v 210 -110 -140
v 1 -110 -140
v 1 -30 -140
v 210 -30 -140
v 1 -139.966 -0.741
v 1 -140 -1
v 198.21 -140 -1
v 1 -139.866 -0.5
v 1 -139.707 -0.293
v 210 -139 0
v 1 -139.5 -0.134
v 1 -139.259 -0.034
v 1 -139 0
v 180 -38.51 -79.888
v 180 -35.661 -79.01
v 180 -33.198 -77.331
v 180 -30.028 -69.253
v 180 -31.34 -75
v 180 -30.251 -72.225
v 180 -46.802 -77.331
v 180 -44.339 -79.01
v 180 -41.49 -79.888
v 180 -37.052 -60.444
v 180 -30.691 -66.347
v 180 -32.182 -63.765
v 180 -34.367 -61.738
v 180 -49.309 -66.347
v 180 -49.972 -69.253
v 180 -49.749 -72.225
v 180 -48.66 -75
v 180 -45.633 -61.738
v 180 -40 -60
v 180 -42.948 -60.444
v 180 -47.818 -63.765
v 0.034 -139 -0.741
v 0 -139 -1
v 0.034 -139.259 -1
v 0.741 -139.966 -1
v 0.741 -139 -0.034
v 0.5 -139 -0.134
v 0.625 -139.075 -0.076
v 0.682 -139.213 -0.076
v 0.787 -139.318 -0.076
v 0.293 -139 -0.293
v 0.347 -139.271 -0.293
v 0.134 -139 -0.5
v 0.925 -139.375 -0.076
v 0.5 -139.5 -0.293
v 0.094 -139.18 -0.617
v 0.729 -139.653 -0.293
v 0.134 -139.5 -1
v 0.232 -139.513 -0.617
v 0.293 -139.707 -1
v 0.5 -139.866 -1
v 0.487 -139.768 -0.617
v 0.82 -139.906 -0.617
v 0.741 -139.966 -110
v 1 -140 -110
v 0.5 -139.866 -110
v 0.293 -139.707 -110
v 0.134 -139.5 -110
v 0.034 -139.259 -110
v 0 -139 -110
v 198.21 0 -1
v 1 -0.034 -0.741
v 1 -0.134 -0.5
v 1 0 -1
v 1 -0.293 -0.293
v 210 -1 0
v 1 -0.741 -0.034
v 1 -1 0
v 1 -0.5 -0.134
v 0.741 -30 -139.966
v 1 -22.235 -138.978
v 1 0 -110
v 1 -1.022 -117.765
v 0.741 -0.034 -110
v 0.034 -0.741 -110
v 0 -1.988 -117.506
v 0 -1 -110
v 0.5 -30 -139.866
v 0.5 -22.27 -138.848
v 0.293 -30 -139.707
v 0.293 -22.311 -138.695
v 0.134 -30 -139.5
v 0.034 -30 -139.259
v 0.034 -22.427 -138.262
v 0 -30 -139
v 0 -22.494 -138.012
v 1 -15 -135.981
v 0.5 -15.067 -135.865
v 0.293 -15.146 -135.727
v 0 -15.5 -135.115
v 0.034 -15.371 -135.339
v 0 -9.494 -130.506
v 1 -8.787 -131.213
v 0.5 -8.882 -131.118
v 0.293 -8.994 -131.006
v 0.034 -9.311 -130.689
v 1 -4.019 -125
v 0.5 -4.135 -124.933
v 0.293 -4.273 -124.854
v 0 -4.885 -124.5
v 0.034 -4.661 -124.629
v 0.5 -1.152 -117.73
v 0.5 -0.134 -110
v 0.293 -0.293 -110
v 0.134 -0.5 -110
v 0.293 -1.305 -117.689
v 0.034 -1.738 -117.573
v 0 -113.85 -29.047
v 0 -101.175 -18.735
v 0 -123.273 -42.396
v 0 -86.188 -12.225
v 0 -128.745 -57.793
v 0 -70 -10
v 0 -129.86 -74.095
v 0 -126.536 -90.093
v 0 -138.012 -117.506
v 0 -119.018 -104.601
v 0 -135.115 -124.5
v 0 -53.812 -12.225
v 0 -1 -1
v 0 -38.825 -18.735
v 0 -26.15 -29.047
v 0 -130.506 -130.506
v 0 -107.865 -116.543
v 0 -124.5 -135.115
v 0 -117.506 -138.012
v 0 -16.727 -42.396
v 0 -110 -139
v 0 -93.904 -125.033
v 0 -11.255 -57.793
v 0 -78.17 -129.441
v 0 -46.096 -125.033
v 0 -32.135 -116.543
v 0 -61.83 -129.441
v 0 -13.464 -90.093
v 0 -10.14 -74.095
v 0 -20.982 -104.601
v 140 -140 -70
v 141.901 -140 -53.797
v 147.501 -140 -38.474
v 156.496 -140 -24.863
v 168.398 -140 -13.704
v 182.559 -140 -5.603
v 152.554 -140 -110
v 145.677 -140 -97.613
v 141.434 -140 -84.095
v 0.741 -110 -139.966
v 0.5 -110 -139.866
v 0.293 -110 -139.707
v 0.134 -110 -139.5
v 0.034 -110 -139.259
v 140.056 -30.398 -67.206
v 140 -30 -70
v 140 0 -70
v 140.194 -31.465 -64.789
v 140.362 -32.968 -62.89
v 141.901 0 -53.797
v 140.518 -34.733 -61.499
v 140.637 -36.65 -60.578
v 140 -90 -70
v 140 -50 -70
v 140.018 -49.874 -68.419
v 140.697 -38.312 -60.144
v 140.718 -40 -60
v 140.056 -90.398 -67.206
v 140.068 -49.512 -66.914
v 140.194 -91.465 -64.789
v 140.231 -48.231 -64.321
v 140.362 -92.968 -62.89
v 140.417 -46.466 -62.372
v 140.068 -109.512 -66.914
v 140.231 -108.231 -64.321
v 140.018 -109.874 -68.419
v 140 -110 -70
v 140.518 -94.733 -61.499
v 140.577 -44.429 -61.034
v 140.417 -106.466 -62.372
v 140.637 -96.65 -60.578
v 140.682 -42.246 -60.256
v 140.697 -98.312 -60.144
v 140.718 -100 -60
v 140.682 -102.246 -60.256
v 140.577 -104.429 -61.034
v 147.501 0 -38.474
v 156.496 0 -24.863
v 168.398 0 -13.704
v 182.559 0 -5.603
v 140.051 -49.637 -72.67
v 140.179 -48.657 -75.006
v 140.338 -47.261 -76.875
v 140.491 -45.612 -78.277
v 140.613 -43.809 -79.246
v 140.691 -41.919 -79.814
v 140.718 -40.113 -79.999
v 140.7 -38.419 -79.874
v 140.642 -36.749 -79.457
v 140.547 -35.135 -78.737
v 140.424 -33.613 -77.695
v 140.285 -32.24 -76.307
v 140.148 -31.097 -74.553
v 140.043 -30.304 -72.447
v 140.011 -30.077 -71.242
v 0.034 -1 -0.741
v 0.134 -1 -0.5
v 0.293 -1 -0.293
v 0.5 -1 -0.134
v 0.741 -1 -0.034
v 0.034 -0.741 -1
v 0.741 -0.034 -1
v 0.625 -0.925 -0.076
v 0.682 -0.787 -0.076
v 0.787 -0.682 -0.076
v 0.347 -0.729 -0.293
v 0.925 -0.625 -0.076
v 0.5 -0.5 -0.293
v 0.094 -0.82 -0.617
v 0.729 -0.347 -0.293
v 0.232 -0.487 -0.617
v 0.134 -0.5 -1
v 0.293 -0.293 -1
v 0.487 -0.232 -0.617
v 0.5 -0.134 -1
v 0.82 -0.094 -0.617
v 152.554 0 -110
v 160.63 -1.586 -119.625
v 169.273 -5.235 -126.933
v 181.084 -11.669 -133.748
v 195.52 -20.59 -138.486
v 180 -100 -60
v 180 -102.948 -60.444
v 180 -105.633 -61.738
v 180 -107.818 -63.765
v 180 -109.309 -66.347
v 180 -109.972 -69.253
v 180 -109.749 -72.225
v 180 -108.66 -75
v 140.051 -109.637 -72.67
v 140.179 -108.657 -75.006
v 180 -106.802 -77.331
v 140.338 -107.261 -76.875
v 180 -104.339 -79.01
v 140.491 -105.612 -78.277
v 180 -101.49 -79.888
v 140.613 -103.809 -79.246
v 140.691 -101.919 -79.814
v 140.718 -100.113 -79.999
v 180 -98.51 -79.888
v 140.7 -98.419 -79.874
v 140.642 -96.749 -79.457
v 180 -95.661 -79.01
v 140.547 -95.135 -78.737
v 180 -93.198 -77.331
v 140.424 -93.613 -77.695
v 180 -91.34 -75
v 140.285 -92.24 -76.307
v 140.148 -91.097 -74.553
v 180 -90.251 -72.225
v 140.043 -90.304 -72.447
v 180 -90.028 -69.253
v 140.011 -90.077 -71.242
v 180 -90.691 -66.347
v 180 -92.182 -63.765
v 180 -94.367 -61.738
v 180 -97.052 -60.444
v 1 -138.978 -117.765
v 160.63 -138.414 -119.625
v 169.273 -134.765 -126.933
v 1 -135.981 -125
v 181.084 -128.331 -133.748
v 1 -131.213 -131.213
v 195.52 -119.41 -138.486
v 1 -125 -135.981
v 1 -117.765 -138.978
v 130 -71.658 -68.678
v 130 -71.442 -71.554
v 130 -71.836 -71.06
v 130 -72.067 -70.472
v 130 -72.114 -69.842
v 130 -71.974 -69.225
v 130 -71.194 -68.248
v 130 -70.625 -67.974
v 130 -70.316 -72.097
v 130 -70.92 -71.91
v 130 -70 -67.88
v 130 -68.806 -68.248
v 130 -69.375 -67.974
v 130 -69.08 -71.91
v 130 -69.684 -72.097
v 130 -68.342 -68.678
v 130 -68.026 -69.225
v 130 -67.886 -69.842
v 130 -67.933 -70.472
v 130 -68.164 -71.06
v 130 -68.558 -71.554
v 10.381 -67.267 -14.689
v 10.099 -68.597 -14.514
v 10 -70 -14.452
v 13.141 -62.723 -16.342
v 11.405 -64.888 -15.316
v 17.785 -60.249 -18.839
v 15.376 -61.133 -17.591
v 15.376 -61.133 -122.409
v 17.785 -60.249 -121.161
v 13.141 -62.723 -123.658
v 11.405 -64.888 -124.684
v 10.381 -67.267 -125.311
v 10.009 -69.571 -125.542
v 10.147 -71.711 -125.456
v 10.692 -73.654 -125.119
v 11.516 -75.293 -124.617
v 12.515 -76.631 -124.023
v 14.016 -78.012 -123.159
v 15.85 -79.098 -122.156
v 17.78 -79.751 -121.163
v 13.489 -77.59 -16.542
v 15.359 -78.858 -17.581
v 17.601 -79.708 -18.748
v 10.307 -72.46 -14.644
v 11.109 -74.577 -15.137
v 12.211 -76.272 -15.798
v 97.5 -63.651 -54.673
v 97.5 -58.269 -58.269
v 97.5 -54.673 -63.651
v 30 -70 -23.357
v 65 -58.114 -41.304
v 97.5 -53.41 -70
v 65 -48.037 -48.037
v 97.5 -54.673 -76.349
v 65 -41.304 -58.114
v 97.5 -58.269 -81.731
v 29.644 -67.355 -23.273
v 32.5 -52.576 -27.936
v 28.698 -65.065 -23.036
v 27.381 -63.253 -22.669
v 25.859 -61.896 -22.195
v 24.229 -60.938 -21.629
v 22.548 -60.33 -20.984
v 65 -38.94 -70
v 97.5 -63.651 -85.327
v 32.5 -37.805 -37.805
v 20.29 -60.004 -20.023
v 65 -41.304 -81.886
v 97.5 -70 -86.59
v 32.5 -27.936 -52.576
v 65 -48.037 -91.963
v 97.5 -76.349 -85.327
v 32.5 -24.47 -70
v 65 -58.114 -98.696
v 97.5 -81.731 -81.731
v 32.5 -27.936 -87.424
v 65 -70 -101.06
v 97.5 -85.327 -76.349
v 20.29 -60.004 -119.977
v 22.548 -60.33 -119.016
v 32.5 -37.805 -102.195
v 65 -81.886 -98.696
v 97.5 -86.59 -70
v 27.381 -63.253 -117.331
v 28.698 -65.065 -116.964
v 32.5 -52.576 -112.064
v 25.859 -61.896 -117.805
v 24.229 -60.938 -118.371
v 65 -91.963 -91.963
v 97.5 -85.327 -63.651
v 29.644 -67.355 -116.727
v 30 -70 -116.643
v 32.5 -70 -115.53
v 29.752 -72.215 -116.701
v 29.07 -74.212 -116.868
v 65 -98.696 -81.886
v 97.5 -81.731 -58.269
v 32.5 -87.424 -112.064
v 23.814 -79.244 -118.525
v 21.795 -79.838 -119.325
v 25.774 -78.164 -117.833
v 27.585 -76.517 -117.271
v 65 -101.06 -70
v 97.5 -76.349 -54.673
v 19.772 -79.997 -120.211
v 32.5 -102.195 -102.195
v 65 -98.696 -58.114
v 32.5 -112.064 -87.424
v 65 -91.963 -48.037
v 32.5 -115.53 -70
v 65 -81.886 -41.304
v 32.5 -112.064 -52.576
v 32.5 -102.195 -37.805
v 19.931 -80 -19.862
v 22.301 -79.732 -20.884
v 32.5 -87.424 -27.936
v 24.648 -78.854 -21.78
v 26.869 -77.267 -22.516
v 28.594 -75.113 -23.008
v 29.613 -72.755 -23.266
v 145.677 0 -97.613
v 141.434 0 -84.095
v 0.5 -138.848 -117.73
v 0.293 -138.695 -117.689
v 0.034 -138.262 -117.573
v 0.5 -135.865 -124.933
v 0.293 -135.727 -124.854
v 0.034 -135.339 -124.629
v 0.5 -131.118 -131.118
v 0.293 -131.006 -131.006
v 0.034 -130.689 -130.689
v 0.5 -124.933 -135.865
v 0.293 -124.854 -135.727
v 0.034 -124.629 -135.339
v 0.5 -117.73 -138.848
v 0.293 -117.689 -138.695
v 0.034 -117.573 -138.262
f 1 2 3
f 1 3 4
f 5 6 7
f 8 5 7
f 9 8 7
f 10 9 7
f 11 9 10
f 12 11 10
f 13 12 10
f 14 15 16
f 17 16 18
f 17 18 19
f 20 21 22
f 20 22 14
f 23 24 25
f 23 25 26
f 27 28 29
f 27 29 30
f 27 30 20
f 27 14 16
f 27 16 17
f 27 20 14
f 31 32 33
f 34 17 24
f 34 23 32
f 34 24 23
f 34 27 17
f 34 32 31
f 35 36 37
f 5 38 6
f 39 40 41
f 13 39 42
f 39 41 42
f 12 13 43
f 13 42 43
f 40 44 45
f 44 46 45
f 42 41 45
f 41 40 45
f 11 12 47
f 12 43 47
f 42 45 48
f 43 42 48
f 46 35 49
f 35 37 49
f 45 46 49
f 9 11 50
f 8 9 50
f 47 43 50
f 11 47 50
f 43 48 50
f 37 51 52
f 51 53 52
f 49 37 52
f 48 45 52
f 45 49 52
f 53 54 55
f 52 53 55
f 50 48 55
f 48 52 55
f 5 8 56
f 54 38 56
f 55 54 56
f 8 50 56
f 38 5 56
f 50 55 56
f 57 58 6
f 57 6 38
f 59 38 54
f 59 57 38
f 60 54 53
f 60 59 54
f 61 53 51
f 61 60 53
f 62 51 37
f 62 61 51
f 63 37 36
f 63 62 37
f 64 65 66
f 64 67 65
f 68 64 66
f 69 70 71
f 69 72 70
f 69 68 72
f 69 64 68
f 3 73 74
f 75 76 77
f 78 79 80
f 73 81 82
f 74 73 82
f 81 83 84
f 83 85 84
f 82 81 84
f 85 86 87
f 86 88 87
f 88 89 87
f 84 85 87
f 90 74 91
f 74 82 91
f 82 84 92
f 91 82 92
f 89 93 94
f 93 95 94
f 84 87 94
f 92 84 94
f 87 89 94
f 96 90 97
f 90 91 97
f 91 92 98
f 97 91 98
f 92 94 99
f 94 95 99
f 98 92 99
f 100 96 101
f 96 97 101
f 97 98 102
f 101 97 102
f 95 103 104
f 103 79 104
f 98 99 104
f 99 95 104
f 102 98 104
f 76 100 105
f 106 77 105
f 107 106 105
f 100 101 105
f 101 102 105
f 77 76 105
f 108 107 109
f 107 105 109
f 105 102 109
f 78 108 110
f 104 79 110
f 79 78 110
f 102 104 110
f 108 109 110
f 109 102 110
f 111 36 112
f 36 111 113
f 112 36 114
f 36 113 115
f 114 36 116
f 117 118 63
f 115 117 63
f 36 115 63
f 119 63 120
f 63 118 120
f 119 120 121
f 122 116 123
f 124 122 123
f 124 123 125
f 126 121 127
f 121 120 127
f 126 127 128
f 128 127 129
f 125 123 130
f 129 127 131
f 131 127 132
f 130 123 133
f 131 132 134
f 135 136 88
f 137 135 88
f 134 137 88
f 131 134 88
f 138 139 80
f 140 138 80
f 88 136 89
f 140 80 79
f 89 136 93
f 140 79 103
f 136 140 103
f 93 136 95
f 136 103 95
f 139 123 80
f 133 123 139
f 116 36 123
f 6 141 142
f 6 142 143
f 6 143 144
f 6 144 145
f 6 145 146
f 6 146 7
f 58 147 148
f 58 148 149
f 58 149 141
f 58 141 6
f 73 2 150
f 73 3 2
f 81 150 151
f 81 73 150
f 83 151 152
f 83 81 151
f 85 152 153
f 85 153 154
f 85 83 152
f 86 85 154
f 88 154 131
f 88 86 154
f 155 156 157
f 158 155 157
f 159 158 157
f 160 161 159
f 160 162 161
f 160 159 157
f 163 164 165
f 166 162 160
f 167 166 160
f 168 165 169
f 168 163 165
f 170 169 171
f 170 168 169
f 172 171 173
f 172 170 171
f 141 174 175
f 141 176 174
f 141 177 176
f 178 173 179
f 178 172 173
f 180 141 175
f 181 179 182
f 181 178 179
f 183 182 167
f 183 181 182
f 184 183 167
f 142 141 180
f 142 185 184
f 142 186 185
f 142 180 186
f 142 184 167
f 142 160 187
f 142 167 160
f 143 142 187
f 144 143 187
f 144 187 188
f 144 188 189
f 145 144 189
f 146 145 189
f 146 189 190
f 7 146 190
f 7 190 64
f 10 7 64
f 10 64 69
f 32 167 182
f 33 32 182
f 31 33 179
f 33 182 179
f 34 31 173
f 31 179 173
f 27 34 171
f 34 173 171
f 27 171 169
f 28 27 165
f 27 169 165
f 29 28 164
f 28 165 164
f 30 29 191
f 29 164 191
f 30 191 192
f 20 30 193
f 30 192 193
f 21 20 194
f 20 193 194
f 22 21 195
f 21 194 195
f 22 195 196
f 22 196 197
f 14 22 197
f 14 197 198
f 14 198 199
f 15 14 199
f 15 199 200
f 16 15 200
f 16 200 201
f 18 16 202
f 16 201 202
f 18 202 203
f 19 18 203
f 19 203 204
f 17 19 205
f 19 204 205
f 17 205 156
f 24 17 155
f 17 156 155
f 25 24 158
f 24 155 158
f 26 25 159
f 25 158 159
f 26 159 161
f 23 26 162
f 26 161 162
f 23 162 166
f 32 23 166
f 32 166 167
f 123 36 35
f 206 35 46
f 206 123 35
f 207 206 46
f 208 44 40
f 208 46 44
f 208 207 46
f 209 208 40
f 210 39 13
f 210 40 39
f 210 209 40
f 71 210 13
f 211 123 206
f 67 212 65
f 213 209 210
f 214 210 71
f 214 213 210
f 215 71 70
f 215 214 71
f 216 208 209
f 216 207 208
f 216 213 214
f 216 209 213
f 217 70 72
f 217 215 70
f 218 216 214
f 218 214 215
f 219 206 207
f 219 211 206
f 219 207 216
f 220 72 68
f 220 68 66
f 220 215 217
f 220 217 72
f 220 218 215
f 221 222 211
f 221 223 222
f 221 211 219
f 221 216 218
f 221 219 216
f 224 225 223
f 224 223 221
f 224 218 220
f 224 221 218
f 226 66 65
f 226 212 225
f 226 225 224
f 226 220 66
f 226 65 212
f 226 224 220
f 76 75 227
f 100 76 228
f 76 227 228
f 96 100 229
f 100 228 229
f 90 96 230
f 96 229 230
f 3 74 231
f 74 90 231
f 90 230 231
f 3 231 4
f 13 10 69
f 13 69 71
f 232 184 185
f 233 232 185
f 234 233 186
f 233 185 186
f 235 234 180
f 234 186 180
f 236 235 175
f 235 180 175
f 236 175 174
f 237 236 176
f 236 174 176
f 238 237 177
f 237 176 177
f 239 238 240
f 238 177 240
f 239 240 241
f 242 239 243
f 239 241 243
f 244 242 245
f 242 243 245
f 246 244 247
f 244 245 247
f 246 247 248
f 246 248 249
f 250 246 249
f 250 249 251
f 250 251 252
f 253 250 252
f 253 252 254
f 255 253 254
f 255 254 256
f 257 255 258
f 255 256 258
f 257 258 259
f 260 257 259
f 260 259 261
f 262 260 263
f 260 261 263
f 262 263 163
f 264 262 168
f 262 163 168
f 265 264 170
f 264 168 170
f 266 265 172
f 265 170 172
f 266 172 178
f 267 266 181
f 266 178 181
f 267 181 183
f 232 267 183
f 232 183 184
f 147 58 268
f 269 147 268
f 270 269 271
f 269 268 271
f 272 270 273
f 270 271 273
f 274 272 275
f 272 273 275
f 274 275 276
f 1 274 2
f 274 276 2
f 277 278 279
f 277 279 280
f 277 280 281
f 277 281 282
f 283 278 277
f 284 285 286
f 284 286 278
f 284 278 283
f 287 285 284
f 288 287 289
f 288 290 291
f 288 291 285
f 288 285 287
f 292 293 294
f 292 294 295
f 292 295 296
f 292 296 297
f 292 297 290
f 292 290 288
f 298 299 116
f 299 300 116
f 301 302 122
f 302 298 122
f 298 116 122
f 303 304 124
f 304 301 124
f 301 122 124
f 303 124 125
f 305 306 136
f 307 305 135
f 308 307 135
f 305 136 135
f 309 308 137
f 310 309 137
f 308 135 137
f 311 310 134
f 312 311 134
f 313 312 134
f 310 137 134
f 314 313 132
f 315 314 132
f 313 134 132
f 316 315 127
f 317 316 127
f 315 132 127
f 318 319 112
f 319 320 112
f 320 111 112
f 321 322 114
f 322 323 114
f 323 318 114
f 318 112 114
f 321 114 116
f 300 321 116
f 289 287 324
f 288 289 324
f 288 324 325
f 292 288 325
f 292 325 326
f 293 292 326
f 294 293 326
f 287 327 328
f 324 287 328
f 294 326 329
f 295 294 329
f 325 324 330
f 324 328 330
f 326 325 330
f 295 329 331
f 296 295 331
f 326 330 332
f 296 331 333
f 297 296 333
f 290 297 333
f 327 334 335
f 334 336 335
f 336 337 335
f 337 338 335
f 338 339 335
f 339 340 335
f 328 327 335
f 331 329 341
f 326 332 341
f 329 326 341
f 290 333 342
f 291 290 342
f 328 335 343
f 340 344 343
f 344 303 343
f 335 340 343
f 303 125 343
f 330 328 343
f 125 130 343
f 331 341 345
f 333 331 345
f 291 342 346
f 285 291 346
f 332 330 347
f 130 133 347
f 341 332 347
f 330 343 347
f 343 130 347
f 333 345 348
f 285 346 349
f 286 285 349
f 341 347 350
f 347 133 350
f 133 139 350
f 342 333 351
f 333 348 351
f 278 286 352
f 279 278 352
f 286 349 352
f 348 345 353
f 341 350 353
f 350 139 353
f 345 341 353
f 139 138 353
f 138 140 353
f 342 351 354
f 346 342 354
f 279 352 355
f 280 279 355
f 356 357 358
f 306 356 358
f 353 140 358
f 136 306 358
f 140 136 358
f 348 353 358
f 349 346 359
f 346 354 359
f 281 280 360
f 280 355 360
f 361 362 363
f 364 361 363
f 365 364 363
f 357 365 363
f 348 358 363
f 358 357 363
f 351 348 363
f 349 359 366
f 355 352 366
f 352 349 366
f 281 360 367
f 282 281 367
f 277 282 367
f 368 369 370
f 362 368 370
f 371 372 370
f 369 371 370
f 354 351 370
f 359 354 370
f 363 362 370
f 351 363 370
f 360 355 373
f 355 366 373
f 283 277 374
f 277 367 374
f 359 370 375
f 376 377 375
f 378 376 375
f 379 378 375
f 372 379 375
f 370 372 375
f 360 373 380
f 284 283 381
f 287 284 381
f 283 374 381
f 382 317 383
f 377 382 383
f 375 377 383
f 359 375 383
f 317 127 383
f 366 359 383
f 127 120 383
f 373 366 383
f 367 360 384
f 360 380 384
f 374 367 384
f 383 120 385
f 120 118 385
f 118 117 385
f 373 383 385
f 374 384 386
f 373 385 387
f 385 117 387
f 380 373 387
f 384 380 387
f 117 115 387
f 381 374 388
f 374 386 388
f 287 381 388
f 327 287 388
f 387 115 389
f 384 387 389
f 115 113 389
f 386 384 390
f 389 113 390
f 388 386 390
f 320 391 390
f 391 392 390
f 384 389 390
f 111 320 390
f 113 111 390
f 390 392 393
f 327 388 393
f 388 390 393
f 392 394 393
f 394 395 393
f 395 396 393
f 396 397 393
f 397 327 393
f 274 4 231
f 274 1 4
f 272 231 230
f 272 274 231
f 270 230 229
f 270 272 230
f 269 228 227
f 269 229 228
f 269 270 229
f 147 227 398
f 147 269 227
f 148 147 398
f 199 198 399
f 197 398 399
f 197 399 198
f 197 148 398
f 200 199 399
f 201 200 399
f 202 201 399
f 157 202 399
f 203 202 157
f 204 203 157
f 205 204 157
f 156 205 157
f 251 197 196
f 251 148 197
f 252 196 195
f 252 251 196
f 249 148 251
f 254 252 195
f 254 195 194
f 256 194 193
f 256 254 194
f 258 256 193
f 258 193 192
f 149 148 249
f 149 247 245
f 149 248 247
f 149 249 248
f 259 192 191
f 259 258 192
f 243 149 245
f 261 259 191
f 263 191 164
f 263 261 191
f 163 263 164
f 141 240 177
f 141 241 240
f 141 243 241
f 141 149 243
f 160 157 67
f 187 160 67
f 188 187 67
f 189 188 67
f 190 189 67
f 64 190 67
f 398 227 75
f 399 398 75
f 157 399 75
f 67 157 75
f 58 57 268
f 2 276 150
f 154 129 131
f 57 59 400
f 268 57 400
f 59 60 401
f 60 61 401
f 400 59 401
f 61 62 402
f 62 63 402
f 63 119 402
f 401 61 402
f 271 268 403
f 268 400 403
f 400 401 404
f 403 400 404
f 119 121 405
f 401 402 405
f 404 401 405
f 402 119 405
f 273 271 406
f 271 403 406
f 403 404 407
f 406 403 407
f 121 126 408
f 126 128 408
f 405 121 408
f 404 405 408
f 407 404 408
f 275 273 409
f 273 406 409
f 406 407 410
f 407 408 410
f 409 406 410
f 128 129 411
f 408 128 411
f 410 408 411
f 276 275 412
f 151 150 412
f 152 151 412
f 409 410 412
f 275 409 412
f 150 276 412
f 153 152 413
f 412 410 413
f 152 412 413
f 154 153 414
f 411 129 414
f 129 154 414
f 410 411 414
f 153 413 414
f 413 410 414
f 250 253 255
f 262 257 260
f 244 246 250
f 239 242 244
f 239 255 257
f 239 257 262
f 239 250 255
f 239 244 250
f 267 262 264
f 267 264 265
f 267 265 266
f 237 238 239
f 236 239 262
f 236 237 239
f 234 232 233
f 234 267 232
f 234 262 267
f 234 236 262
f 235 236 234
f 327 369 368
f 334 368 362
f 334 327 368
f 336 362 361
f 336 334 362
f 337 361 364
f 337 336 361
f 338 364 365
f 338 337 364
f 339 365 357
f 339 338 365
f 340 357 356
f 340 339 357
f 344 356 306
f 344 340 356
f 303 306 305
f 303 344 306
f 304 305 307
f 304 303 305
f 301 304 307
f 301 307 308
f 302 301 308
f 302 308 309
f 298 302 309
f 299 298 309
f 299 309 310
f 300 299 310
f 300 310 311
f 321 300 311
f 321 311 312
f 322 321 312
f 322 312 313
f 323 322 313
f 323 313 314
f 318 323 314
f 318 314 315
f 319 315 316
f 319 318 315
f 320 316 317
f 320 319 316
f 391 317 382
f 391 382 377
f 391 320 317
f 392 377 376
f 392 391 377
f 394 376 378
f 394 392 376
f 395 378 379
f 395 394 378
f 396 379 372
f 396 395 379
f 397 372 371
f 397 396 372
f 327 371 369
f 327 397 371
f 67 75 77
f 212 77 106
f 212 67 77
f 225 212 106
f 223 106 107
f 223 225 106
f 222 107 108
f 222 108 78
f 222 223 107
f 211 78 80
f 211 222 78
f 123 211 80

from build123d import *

# Parameters (mm, degrees)
SKETCH1_W           = 140
SKETCH1_H           = 140
BOSS_EXTRUDE1_DEPTH = 140
SKETCH2_R           = 60
CUT_EXTRUDE1_DEPTH  = 130
CUT_EXTRUDE1_DRAFT  = -24
SKETCH3_R           = 10
BOSS_EXTRUDE2_DEPTH = 140
BOSS_EXTRUDE3_DEPTH = 140
SKETCH5_R           = 10
BOSS_EXTRUDE4_DEPTH = 40
FILLET1_R           = 30
FILLET2_R           = 1


with BuildPart() as part:
    # Sketch1 → Boss-Extrude1 (new body)
    with BuildSketch(Plane(origin=(0, 0, 0), x_dir=(0, 0, -1), z_dir=(1, 0, 0))):
        with Locations((70, -70)):
            Rectangle(SKETCH1_W, SKETCH1_H)
    extrude(amount=BOSS_EXTRUDE1_DEPTH)


with BuildPart() as cut_extrude1_tool:
    # Sketch2 → Cut-Extrude1 (with draft: the straight prism first)
    with BuildSketch(Plane.ZY):
        with Locations((-70, -70)):
            Circle(SKETCH2_R)
    extrude(amount=-CUT_EXTRUDE1_DEPTH)
    # Cut-Extrude1: the draft: its side faces are tilted about the plane it starts from
    cut_extrude1_sides = [cut_extrude1_tool.faces().sort_by_distance(p)[0] for p in [
        (65, -70, -130),
    ]]
    draft(cut_extrude1_sides, Plane.ZY, CUT_EXTRUDE1_DRAFT)


with BuildPart() as part_1:
    add(part.part)

    # Cut-Extrude1: cut by cut_extrude1_tool
    add(cut_extrude1_tool.part, mode=Mode.SUBTRACT)

    # Sketch3 → Boss-Extrude2 (add)
    with BuildSketch(Plane.XY):
        with Locations((20, -70)):
            Circle(SKETCH3_R)
    extrude(amount=-BOSS_EXTRUDE2_DEPTH)

    # Sketch4 → Boss-Extrude3 (add)
    with BuildSketch(Plane(origin=(0, -140, 0), x_dir=(-1, 0, 0), z_dir=(0, -1, 0))):
        with BuildLine():
            ThreePointArc((-210, 140), (-160.502525317, 119.497474683), (-140, 70))
            Line((-140, 70), (-140, 140))
            Line((-140, 140), (-210, 140))
        make_face()
        with BuildLine():
            Line((-210, 0), (-140, 0))
            Line((-140, 0), (-140, 70))
            ThreePointArc((-140, 70), (-160.502525317, 20.502525317), (-210, 0))
        make_face()
    extrude(amount=-BOSS_EXTRUDE3_DEPTH)

    # Sketch5 → Boss-Extrude4 (add)
    with BuildSketch(Plane(origin=(140, 0, 0), x_dir=(0, 0, -1), z_dir=(1, 0, 0))):
        with Locations(Location((70, -100, 0), (0, 0, 180))):
            Circle(SKETCH5_R)
        with Locations(Location((70, -40, 0), (0, 0, 180))):
            Circle(SKETCH5_R)
    extrude(amount=BOSS_EXTRUDE4_DEPTH)

    # Fillet1
    fillet1_edges = [part_1.edges().sort_by_distance(p)[0] for p in [
        (105, 0, -140),
        (105, -140, -140),
    ]]
    fillet(fillet1_edges, radius=FILLET1_R)

    # Fillet2
    fillet2_edges = [part_1.edges().sort_by_distance(p)[0] for p in [
        (0, -140, -55),
        (0, -70, 0),
        (0, 0, -55),
        (0, -70, -140),
        (0, -131.213203436, -131.213203436),
        (0, -8.786796564, -131.213203436),
        (105, 0, 0),
        (105, -140, 0),
    ]]
    fillet(fillet2_edges, radius=FILLET2_R)


solid = part_1.part
